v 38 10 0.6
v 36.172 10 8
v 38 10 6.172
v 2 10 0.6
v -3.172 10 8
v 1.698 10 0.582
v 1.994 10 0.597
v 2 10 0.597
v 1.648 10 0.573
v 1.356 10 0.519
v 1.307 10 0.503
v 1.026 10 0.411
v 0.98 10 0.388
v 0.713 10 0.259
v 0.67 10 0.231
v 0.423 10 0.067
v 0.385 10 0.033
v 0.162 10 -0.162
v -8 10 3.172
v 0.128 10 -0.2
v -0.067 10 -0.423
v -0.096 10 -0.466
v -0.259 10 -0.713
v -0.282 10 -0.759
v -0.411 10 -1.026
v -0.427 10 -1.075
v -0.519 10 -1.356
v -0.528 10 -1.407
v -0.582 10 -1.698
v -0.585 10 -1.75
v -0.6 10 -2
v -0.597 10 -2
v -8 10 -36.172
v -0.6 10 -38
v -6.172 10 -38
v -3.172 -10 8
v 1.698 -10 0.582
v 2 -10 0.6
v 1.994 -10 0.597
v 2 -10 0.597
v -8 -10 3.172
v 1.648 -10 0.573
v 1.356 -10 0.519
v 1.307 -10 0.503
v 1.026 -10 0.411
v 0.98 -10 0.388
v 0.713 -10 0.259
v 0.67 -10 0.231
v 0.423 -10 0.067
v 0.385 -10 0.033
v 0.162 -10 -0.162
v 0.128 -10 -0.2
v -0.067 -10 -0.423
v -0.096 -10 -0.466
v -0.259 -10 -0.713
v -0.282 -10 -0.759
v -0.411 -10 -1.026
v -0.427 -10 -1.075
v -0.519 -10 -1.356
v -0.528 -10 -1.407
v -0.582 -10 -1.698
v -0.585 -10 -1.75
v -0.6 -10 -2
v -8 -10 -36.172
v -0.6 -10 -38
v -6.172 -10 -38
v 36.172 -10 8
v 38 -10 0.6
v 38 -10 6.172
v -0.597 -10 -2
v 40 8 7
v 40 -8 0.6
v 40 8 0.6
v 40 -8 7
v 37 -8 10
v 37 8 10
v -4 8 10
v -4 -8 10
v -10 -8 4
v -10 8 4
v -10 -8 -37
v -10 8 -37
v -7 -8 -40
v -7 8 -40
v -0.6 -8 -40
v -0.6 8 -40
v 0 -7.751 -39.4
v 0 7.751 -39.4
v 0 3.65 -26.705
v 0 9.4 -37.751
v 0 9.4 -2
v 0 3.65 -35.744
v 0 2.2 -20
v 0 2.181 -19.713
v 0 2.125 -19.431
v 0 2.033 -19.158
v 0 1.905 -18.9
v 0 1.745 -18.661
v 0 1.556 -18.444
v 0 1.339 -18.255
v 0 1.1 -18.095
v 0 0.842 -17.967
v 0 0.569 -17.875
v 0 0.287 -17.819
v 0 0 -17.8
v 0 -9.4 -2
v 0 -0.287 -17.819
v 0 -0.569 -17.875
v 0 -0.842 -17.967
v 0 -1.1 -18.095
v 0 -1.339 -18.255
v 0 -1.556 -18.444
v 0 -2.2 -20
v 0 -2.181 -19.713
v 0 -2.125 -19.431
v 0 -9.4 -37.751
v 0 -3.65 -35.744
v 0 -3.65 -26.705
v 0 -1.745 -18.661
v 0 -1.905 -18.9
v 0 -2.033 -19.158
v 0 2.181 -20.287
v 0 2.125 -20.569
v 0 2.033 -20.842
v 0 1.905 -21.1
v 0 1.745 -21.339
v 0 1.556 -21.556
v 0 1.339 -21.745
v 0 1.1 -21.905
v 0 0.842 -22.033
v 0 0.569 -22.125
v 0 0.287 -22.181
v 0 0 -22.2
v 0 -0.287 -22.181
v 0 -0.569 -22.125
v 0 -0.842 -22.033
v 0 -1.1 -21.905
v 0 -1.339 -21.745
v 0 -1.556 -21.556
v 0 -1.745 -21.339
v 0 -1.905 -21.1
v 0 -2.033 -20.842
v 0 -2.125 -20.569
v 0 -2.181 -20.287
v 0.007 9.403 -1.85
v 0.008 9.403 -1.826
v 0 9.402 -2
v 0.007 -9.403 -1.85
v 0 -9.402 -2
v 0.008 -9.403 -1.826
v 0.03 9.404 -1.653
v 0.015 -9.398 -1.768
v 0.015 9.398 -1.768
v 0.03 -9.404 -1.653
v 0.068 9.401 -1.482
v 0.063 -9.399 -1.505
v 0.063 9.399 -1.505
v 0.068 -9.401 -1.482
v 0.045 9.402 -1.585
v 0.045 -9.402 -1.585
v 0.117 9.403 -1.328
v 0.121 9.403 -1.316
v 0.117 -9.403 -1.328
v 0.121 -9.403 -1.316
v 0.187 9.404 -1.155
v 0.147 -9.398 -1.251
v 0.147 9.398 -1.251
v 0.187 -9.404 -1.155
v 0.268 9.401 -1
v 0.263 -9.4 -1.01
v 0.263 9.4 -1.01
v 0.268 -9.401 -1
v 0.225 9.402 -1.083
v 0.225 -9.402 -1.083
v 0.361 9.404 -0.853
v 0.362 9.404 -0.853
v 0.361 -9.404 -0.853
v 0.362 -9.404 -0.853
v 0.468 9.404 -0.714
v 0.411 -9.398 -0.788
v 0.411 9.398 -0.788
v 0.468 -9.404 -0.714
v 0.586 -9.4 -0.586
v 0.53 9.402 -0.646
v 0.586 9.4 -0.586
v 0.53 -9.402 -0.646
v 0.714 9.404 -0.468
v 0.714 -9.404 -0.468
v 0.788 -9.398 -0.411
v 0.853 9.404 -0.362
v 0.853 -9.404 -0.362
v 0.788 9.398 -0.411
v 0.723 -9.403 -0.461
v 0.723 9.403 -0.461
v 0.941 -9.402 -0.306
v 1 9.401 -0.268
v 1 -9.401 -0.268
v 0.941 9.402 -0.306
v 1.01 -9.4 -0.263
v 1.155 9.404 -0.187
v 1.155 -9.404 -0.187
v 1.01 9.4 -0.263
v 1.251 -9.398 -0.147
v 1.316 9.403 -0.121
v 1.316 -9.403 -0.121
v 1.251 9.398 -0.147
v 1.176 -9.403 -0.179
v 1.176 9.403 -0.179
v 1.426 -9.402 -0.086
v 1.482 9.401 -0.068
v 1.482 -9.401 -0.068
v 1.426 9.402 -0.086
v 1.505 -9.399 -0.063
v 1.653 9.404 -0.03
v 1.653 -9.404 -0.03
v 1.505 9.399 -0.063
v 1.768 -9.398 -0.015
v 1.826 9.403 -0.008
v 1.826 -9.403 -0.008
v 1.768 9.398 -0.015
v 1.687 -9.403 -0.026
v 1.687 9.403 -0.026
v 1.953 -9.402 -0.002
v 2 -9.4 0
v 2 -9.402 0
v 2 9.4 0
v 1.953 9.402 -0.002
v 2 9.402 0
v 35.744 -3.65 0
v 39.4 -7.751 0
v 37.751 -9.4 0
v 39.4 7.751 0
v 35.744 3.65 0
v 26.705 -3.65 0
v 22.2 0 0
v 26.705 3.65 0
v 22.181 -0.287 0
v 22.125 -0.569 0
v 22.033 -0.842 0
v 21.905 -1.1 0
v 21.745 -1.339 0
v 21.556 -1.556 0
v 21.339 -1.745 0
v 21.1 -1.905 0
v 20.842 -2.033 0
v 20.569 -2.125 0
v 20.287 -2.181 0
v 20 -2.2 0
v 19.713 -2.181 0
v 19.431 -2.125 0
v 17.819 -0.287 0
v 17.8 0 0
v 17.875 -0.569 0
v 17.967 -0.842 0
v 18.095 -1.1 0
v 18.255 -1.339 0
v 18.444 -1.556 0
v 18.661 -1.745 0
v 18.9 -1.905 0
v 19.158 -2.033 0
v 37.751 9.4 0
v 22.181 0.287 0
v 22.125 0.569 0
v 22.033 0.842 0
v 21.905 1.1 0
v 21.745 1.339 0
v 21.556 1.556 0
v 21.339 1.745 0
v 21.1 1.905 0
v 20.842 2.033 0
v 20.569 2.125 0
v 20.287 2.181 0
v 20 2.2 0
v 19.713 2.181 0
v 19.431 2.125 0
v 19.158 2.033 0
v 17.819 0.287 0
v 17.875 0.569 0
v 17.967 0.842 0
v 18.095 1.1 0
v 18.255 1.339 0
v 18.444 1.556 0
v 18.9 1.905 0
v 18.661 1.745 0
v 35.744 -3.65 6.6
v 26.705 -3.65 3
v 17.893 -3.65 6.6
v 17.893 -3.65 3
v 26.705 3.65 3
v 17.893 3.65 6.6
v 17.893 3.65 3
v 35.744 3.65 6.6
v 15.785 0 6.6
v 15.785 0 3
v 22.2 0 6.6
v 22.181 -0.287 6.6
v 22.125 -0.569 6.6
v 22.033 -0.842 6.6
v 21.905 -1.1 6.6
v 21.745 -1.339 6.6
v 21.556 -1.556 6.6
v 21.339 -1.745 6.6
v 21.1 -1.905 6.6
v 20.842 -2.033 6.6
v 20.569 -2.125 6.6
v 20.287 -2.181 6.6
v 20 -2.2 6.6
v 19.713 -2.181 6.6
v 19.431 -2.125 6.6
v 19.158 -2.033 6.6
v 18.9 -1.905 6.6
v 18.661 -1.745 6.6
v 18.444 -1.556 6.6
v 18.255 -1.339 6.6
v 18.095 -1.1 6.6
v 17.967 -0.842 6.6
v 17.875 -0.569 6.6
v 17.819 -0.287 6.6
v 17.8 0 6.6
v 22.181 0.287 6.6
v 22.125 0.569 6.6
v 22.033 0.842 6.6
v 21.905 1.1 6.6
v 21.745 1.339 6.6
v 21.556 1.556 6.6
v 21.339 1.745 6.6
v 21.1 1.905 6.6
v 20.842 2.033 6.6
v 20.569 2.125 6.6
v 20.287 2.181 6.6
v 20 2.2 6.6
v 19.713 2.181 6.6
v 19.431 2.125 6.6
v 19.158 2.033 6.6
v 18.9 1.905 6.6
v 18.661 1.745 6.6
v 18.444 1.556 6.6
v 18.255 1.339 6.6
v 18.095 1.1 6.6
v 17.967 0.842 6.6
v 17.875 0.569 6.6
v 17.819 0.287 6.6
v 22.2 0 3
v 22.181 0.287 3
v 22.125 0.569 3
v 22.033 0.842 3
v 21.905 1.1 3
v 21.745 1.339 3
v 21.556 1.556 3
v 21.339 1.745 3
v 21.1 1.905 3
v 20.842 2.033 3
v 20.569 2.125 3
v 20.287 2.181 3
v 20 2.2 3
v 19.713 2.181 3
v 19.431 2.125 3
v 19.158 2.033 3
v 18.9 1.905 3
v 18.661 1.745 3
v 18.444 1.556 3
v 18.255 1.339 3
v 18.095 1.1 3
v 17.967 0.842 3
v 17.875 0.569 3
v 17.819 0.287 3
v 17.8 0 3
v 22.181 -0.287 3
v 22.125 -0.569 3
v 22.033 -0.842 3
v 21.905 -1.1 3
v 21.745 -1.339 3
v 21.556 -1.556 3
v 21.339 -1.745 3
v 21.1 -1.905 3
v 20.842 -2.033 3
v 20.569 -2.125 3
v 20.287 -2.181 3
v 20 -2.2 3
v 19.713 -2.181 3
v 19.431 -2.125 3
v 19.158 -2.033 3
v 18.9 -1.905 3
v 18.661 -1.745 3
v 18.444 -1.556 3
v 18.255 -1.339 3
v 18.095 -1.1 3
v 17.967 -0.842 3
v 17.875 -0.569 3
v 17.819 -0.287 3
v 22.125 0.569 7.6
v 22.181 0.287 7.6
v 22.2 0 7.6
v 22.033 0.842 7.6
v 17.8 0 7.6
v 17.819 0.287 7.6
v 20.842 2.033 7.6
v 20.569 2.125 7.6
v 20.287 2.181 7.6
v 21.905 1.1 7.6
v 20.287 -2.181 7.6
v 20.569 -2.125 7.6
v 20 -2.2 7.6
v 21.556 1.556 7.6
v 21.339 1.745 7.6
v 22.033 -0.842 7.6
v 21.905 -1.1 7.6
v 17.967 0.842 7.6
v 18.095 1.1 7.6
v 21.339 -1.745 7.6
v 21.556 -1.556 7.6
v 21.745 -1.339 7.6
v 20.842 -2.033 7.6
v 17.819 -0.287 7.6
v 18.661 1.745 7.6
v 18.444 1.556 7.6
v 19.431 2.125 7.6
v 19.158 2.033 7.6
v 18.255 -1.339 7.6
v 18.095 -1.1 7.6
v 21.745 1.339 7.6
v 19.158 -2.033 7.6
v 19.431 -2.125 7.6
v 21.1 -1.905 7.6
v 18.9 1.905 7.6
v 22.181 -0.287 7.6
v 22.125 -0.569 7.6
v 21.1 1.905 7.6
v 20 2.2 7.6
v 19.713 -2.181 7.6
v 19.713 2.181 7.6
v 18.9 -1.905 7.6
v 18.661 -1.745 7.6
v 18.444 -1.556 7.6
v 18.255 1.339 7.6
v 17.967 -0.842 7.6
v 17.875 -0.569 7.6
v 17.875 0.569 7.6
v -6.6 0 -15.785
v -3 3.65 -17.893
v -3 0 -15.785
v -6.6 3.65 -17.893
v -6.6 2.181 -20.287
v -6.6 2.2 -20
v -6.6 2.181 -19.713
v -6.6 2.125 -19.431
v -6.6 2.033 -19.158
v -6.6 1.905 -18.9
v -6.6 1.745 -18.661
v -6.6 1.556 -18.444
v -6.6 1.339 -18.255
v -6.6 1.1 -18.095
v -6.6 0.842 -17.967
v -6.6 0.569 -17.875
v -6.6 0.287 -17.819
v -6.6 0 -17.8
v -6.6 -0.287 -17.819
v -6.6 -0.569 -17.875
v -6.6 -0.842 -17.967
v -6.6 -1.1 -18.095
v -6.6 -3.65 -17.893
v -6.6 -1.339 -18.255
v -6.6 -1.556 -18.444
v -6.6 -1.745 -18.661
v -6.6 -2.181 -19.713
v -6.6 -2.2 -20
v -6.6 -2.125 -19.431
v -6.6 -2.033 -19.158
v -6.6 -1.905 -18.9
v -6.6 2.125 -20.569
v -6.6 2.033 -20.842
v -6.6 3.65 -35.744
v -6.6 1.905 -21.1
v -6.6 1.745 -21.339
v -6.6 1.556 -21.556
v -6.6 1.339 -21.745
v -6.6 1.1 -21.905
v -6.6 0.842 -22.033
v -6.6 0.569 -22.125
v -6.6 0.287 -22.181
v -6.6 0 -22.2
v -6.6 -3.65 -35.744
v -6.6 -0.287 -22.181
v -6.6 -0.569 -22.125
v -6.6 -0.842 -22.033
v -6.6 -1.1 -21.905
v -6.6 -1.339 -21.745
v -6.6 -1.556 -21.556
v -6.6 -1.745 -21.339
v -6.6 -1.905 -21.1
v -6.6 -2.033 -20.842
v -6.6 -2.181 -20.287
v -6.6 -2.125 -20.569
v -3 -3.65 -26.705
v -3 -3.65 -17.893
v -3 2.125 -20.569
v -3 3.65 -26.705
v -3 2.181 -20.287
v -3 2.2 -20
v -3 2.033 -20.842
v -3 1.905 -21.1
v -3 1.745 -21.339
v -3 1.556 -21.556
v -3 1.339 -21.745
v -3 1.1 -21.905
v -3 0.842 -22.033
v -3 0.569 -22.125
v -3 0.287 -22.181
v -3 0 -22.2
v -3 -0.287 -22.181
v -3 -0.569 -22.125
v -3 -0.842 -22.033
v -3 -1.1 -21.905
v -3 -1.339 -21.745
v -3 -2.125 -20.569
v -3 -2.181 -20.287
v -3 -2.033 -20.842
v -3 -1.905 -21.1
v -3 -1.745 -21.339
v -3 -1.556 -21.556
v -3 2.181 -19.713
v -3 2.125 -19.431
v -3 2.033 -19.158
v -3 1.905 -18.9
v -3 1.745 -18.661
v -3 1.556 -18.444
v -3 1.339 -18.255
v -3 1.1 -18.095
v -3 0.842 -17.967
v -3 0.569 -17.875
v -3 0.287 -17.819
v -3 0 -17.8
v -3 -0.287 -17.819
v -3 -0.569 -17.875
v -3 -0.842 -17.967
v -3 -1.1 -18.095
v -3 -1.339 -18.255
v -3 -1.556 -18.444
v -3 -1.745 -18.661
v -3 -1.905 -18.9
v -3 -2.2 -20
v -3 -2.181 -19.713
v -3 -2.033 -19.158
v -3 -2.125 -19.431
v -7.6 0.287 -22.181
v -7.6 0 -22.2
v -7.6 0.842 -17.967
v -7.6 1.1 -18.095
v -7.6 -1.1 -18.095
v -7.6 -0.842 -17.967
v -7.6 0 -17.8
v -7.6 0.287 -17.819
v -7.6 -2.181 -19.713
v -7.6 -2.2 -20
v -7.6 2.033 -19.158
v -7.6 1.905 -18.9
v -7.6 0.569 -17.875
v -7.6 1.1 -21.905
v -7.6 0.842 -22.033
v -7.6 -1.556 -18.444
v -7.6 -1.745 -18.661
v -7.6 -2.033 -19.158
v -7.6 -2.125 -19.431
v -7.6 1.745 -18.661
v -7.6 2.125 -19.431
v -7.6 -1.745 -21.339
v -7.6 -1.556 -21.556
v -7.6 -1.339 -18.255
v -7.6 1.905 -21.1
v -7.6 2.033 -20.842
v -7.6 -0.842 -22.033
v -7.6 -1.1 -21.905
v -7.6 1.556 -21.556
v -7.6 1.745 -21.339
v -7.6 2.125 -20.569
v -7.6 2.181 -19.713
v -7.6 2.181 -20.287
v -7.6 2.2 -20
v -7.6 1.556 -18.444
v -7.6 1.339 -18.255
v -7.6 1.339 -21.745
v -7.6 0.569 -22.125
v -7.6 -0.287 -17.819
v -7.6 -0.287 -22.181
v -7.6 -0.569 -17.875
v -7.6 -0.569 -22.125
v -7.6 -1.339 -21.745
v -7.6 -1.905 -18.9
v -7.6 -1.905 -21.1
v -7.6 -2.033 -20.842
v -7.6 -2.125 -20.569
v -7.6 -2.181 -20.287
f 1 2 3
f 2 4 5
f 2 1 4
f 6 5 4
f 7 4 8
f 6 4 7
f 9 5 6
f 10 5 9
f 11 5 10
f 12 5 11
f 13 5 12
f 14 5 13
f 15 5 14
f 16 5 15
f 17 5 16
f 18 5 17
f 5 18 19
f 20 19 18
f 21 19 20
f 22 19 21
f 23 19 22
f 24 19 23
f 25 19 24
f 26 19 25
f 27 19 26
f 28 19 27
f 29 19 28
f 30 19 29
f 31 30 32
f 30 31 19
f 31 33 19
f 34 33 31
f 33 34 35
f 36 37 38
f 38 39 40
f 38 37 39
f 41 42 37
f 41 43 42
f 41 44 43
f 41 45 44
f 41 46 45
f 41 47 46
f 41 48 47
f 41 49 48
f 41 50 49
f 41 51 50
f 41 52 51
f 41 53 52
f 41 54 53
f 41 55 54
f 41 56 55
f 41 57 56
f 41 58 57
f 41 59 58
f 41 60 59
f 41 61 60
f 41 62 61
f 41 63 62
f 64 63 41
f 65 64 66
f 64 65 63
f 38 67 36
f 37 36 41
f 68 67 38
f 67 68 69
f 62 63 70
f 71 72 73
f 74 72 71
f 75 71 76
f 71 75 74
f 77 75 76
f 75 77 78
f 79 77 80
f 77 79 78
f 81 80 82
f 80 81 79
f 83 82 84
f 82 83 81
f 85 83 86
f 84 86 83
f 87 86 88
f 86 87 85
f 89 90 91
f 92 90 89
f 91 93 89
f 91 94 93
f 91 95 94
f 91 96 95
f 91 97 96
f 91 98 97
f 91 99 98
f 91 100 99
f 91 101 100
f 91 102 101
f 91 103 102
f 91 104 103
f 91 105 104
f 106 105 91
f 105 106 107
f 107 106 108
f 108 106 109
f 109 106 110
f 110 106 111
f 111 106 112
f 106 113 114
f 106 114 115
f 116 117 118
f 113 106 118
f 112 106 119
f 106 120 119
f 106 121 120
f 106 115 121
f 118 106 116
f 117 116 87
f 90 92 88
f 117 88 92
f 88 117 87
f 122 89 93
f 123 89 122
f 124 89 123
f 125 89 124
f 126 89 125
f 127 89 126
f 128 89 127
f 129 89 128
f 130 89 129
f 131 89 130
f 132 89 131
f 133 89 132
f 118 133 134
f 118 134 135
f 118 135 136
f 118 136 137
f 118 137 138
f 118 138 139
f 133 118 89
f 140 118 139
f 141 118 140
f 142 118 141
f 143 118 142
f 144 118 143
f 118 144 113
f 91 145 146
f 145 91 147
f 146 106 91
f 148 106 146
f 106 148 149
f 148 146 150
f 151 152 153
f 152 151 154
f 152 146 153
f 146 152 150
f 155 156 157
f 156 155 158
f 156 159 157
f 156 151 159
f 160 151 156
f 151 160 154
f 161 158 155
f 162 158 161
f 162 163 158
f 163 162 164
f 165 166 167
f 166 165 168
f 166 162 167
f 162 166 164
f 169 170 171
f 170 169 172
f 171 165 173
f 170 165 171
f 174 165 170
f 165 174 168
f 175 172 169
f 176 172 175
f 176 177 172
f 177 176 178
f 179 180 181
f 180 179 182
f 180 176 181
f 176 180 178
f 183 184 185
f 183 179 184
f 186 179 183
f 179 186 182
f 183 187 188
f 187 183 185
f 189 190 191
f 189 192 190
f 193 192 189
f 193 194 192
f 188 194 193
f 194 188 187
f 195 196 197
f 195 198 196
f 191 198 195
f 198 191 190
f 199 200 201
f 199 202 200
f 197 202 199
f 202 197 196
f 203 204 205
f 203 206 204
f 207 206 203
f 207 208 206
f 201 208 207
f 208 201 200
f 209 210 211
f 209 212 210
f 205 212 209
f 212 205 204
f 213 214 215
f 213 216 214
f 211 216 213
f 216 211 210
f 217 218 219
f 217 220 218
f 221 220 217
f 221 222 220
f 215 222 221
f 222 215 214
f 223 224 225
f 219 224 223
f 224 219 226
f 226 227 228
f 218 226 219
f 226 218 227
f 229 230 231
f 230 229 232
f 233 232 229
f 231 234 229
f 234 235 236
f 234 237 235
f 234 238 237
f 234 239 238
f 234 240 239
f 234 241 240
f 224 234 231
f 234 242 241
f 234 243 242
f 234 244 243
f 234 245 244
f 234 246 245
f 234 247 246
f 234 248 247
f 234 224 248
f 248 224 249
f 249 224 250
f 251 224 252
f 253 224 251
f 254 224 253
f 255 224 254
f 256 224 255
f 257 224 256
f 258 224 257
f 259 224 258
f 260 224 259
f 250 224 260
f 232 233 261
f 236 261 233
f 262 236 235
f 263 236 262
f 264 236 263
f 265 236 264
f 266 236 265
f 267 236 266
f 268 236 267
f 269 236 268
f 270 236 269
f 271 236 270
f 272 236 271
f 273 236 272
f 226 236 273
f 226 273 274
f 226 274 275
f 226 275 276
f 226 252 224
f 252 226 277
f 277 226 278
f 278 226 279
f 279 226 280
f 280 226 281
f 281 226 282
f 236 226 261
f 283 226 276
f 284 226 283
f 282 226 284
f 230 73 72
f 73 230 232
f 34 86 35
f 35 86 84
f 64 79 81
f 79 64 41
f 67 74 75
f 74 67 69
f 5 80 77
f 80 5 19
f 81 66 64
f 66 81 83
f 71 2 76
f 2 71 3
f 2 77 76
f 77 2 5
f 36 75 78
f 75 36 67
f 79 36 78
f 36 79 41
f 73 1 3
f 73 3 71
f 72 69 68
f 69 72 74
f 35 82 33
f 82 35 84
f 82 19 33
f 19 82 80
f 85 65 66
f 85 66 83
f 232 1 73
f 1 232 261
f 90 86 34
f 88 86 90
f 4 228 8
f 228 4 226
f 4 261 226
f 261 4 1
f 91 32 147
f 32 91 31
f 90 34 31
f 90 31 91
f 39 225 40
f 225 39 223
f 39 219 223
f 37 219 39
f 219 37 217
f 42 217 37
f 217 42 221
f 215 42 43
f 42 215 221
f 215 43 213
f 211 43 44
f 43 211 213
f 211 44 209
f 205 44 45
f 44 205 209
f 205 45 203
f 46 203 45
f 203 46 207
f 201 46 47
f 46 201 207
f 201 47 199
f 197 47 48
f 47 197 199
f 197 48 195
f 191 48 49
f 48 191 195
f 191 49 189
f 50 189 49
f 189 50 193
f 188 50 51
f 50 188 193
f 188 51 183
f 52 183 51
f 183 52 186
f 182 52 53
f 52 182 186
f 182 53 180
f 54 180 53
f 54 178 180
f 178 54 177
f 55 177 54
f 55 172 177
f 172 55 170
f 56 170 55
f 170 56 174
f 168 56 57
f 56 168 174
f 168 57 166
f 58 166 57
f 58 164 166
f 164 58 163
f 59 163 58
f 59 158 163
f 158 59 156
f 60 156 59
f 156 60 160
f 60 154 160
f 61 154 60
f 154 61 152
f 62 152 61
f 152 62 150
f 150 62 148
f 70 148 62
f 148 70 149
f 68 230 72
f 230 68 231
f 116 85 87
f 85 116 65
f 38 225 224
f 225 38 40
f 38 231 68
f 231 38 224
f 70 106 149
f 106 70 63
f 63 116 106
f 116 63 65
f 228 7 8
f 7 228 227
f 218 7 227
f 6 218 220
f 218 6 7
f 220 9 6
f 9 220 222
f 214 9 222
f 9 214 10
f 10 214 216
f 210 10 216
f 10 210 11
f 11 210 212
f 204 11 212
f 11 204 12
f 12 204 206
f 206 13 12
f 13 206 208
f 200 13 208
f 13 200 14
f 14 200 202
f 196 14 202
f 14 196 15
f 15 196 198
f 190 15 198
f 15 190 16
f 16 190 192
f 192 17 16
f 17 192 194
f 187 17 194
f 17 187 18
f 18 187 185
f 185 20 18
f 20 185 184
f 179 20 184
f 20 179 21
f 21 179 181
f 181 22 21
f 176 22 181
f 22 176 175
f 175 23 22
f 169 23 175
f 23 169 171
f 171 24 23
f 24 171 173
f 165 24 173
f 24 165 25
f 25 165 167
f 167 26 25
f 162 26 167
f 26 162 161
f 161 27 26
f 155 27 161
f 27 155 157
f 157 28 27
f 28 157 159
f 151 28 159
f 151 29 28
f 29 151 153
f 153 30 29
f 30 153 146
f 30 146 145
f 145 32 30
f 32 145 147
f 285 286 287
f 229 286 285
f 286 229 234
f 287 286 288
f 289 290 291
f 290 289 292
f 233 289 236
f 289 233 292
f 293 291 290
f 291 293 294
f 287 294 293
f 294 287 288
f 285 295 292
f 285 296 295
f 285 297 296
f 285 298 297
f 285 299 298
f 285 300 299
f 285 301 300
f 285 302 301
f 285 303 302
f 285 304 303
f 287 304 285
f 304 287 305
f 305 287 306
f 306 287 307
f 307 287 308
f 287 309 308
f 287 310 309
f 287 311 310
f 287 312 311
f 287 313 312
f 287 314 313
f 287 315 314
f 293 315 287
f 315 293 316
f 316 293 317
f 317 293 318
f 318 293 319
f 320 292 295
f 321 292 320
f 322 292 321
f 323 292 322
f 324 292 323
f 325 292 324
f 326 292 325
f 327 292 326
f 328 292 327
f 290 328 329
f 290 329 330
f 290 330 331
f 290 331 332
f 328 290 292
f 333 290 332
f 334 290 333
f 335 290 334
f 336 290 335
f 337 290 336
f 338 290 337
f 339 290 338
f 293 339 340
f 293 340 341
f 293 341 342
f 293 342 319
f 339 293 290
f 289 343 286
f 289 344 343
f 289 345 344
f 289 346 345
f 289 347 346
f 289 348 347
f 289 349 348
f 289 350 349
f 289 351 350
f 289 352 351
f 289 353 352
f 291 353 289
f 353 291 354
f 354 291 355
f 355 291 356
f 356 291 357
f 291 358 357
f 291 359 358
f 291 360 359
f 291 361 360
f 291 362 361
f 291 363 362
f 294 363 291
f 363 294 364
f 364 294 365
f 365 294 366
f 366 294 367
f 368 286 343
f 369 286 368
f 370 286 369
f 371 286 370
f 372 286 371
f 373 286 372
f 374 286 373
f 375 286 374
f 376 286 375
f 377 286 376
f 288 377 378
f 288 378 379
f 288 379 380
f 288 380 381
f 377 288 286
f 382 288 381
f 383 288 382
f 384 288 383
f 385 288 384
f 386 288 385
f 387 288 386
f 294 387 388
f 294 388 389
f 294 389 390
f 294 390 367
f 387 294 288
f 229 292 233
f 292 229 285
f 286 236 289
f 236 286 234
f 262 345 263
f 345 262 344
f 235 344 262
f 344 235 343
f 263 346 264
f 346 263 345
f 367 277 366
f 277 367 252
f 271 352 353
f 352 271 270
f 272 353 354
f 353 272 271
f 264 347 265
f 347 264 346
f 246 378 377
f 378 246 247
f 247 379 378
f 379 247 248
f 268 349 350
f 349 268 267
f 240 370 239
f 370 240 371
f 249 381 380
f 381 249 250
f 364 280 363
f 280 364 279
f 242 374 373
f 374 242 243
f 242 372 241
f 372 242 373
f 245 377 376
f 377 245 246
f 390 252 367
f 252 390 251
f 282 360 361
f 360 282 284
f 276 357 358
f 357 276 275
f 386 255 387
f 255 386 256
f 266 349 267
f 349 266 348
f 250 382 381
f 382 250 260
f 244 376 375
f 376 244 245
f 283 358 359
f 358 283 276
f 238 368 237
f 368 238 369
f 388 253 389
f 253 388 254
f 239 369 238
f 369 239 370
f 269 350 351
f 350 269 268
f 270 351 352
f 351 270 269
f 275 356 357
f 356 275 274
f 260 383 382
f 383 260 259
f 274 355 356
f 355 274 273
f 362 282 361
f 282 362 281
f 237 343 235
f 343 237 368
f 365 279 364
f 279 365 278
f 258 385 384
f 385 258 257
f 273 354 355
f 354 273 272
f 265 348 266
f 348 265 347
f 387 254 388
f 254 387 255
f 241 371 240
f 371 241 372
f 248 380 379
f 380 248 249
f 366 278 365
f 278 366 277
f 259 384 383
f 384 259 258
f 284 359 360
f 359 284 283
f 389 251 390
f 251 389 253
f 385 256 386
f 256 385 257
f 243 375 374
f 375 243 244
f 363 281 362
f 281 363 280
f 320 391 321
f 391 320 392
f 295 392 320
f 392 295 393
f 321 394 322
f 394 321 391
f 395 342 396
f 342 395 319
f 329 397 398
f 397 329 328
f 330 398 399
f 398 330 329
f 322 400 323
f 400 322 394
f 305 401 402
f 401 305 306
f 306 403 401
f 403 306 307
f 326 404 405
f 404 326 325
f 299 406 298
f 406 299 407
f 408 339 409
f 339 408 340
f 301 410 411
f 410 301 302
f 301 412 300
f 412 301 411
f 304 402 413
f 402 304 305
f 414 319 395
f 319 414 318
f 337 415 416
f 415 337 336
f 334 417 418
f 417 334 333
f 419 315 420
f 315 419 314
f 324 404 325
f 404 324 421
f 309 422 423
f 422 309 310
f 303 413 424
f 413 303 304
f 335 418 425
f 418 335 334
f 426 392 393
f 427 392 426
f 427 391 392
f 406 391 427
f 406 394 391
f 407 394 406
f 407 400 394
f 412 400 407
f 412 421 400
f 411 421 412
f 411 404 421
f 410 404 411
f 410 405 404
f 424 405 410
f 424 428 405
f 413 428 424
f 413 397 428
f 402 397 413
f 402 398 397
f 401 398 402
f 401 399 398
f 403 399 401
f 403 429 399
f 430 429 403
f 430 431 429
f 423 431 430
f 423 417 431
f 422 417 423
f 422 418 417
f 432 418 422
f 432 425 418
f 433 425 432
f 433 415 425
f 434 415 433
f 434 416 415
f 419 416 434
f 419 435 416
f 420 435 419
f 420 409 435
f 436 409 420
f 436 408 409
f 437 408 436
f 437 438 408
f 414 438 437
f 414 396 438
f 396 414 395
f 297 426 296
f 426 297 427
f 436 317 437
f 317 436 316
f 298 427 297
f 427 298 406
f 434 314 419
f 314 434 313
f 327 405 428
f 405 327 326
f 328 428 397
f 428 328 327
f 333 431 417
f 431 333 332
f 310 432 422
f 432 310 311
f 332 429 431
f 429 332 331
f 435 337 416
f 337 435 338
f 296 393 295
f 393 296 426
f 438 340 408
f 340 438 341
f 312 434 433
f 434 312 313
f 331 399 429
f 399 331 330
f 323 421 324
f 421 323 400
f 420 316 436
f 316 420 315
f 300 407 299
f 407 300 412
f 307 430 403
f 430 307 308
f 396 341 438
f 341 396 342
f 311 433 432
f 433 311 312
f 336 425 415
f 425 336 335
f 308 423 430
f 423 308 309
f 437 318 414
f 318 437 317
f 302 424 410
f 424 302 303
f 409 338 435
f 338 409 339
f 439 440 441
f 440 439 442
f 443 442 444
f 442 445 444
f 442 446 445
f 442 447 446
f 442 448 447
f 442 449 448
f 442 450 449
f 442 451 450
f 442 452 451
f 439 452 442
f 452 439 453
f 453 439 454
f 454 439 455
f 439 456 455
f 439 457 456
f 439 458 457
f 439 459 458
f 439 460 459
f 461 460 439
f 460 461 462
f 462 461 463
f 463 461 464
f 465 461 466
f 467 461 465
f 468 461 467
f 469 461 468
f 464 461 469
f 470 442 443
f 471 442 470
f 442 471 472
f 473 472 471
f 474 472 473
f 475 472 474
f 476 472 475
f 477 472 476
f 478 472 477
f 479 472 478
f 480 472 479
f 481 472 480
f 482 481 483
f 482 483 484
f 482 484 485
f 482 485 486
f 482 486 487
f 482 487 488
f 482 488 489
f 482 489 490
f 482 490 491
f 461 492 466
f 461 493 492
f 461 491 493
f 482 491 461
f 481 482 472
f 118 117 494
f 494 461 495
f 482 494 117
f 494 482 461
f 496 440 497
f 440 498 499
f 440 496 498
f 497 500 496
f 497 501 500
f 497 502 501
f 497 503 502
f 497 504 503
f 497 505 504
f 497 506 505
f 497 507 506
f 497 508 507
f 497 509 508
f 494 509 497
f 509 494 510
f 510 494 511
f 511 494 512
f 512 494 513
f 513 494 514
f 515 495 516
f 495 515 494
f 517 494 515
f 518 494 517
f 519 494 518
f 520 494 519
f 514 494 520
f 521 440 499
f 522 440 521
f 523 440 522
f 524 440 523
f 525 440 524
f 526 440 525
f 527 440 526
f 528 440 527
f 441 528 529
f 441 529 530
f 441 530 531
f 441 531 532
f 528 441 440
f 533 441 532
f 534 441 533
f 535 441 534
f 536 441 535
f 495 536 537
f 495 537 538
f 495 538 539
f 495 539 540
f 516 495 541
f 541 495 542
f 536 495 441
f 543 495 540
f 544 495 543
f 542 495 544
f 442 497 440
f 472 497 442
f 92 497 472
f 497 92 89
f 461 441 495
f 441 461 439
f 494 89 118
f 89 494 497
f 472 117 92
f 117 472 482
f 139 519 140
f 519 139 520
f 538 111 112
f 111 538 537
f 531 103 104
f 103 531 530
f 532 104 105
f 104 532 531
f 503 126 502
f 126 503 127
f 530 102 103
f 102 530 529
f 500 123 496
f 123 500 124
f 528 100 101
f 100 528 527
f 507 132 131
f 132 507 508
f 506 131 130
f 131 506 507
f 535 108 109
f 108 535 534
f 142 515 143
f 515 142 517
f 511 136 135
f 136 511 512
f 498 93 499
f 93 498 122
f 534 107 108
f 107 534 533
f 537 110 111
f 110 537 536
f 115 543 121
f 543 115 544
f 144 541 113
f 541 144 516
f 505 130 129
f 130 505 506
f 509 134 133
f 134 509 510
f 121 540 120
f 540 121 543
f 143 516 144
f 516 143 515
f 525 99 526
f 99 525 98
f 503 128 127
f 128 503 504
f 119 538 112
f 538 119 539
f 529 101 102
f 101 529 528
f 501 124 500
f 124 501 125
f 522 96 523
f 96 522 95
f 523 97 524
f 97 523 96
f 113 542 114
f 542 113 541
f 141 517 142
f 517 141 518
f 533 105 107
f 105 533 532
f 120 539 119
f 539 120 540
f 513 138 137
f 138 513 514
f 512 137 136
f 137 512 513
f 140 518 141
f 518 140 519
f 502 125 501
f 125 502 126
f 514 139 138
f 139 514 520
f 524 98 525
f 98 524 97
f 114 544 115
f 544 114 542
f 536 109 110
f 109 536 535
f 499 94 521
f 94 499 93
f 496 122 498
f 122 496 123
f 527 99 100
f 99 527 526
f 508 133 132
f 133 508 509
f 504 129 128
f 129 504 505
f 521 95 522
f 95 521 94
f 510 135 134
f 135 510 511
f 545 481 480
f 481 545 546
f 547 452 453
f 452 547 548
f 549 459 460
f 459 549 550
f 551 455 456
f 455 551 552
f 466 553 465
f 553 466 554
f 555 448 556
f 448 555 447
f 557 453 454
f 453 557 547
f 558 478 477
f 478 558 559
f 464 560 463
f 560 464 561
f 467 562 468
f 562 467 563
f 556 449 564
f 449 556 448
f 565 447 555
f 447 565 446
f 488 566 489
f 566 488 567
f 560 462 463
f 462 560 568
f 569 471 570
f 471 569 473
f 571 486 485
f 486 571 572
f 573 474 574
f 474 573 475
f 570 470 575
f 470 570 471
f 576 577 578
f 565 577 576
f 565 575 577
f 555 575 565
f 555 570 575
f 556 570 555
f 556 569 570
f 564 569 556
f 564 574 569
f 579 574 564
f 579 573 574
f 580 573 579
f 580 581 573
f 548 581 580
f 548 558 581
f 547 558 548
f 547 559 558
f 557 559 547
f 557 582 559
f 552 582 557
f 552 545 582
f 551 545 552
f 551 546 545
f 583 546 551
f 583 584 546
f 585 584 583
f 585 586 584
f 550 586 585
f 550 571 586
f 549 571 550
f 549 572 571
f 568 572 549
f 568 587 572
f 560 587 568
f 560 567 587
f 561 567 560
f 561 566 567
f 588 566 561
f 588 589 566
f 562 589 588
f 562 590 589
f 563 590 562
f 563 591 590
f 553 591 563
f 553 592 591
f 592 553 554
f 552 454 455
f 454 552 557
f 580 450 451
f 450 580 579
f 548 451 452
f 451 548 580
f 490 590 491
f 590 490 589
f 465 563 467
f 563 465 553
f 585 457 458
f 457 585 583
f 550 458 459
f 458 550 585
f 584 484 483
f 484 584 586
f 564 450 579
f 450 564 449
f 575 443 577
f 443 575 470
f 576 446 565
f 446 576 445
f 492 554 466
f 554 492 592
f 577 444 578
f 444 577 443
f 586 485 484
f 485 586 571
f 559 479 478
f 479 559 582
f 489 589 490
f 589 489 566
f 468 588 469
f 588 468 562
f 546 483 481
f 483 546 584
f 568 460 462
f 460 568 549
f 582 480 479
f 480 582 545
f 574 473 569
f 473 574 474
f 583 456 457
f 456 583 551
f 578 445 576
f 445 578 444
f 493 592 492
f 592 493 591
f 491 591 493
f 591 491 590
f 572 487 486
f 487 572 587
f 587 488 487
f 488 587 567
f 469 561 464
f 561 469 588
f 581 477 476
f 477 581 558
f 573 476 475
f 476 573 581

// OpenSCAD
// file: inspection.scad
// Optional section clipping for OpenSCAD Customizer inspection.
// The bracket's default "None" mode passes the geometry through unchanged.
// For X/Y/Z, intersect geometry with a slab of the requested depth in mm.
module util_section_inspect(axis = "None", position_mm = 0, depth_mm = 10, direction = "Positive") {
    if (axis == "None")
        children();
    else {
        extent = 10000;
        low = (direction == "Negative") ? position_mm - depth_mm : position_mm;
        intersection() {
            children();
            if (axis == "X")
                translate([low, -extent / 2, -extent / 2])
                    cube([depth_mm, extent, extent]);
            else if (axis == "Y")
                translate([-extent / 2, low, -extent / 2])
                    cube([extent, depth_mm, extent]);
            else if (axis == "Z")
                translate([-extent / 2, -extent / 2, low])
                    cube([extent, extent, depth_mm]);
        }
    }
}
// main file
// Outside-corner L bracket for plywood joints.
// All dimensions are in millimetres. Adjust settings in the OpenSCAD Customizer.
//
// Side view (X to the right, Z upwards), with wood inside the bracket:
//
//     ____________________        <- bracket, top arm (outside the horizontal panel)
//    /  ##################
//   |  ||==================      <- horizontal plywood panel (10 mm)
//   |  ||
//   |  ||  vertical plywood panel
//   |  ||
//    bracket, vertical arm (outside the upright panel)
//
// Bolts enter from inside the plywood and thread into captive nuts in the bracket.
// Insert a nut through the access window on the wood-facing side of the bracket,
// slide it under the 3 mm retaining wall and push it against the stop.
// Hook the plug tab under the retaining lip, then press the opposite end down.
// The plywood covers the window; the outside face of the bracket stays solid.
//
// PRINTING: put the bracket on one flat side and the plugs on their sides.
// This lets layer lines follow the part outlines for improved strength.
//
// Requires inspection.scad in this directory for the optional section view.

use <inspection.scad>

/* [Display] */
part = "bracket"; // [bracket, plug]
show_wood  = true;     // translucent plywood preview; excluded from STL
show_plugs = false;    // display fitted plugs; excluded from STL
part_color = [0.29, 0.56, 0.72]; // color
plug_color = [0.93, 0.58, 0.22]; // color

/* [Section inspection] */
c_section_axis = "None";     // [None, X, Y, Z]
c_section_position_mm = 0;          // [-60:0.5:60]
c_section_depth_mm = 10;         // [0.1:0.1:80]
c_section_direction = "Positive"; // [Positive, Negative]

/* [Plywood] */
plywood_thickness = 10;     // plywood thickness
preview_panel_width = 60;     // panel width, display only
preview_panel_length = 80;     // panel length, display only

/* [Bracket geometry] */
bracket_width        = 20;   // bracket width across Y
wall_thickness       = 10;   // nominal arm thickness
horizontal_arm_length = 40;  // top-arm length
vertical_arm_length   = 40;  // vertical-arm length
outer_corner_chamfer  = 6;   // large 45-degree outer corner chamfer
arm_end_chamfer       = 3;   // 45-degree chamfer at both arm ends
side_edge_chamfer     = 2;   // bevel on the broad side-face outer edges; 0 disables

/* [Print compensation] */
elephant_foot_relief = 0.6; // 45-degree relief at print-facing contact edges; 0 disables
inside_corner_radius = 2.0; // plywood inside corner must match; use 0 or >= 1 mm

/* [Bolt and captive nut] */
bolt_offset                 = 10;    // bolt position beyond the inner face of the other panel
nut_type                    = "hex"; // [hex, square]
bolt_diameter               = 4;
bolt_clearance              = 0.4;
nut_across_flats            = 7;     // measure actual M4 nuts
nut_thickness               = 3.2;
nut_clearance               = 0.3;
retaining_wall_thickness    = 3;     // load-bearing wall between plywood and nut
blind_bolt_clearance_depth  = 1;     // extra bolt depth behind the nut
// Nominal M4x16 is only a starting assumption; verify the real stack-up.

/* [Window plug] */
plug_clearance            = 0.15;
nut_to_window_slot_length = 2.5; // free slot used by the plug hook
plug_tab_thickness        = 2.4;
window_extra_length       = 0.6;  // allows angled plug insertion
plug_end_chamfer          = 1.0;  // insertion bevel at the far end
plug_handle               = "hole"; // [hole, slot, none]

/* [Hidden] */
$fn = 48;

// ---------- Derived dimensions ----------
nut_pocket_width = nut_across_flats + nut_clearance;   // nut pocket width (across flats)
nut_pocket_length = (nut_type == "hex") ? nut_pocket_width / cos(30) : nut_pocket_width;   // pocket length (hex vertex-to-vertex)
nut_pocket_depth = nut_thickness + 0.4;           // nut-pocket depth
outside_skin = wall_thickness - retaining_wall_thickness - nut_pocket_depth - blind_bolt_clearance_depth;   // closed outside wall
window_depth = retaining_wall_thickness + nut_pocket_depth;  // window depth from wood-facing surface
window_length = nut_pocket_length + window_extra_length;        // window length
plug_tab_length = nut_to_window_slot_length - 0.2;         // plug tab length

top_bolt_x = plywood_thickness + bolt_offset;           // top-arm bolt X position
vertical_bolt_z = -(plywood_thickness + bolt_offset);        // vertical-arm bolt Z position
top_window_start_x = top_bolt_x + nut_pocket_length / 2 + nut_to_window_slot_length;    // top-arm window start
vertical_window_start_z = vertical_bolt_z - nut_pocket_length / 2 - nut_to_window_slot_length;    // vertical-arm window start

echo("Outer skin behind nut (mm):", outside_skin);
echo("Window end (mm):", top_window_start_x + window_length, " arm length:", horizontal_arm_length);

// ---------- Plywood preview (joint corner at origin) ----------
module wood() {
    color("burlywood", 0.45) difference() {
        union() {
            translate([0, -preview_panel_width / 2, -plywood_thickness]) cube([preview_panel_length, preview_panel_width, plywood_thickness]);
            translate([0, -preview_panel_width / 2, -preview_panel_length]) cube([plywood_thickness, preview_panel_width, preview_panel_length - plywood_thickness]);
        }
        translate([top_bolt_x, 0, -plywood_thickness - 1]) cylinder(d = bolt_diameter + bolt_clearance, h = plywood_thickness + 2);
        translate([-1, 0, vertical_bolt_z]) rotate([0, 90, 0]) cylinder(d = bolt_diameter + bolt_clearance, h = plywood_thickness + 2);
        // Remove material at the inside corner to match the bracket radius.
        if (inside_corner_radius > 0) difference() {
            translate([-1, -preview_panel_width / 2 - 1, -inside_corner_radius]) cube([inside_corner_radius + 1, preview_panel_width + 2, inside_corner_radius + 1]);
            translate([inside_corner_radius, 0, -inside_corner_radius]) rotate([90, 0, 0]) cylinder(r = inside_corner_radius, h = preview_panel_width + 4, center = true);
        }
    }
}

// ---------- Bracket side profile ----------
// Make the inside fillet from ordinary 2D shapes, before extrusion.
// The square sits in the open part of the L, at the sharp inner corner.
// Subtracting a circle leaves only the small curved region to add.
// Keep 72 segments (5 degrees each) to match the legacy 19-point arc.
module inside_corner_fill_2d(r) {
    difference() {
        translate([0, -r]) square([r, r]);
        translate([r, -r]) circle(r = r, $fn = 72);
    }
}

// End edges also receive elephant-foot relief so the wood-facing bevel
// continues around side edges, ends, and the inside corner.
top_arm_inner_tip_points  = (elephant_foot_relief > 0) ? [[horizontal_arm_length - elephant_foot_relief, 0], [horizontal_arm_length, elephant_foot_relief]] : [[horizontal_arm_length, 0]];
vertical_arm_inner_tip_points = (elephant_foot_relief > 0) ? [[-elephant_foot_relief, -vertical_arm_length], [0, -vertical_arm_length + elephant_foot_relief]] : [[0, -vertical_arm_length]];

// Draw the unchanged L outline with a sharp inside corner at (0,0).
// The arm-end and outside-corner chamfers are part of this outline.
module base_profile_2d() {
    polygon(concat(top_arm_inner_tip_points, [
        [horizontal_arm_length, wall_thickness - arm_end_chamfer],            // 45-degree top-arm end
        [horizontal_arm_length - arm_end_chamfer, wall_thickness],
        [-wall_thickness + outer_corner_chamfer, wall_thickness],
        [-wall_thickness, wall_thickness - outer_corner_chamfer],             // 45-degree outside corner
        [-wall_thickness, -vertical_arm_length + arm_end_chamfer],
        [-wall_thickness + arm_end_chamfer, -vertical_arm_length]           // 45-degree vertical-arm end
    ], vertical_arm_inner_tip_points, [[0, 0]]));
}

// Complete the side profile in 2D, then extrude it in profile_body().
// Radius zero leaves the original sharp corner without creating a square.
module bracket_profile_2d() {
    union() {
        base_profile_2d();
        if (inside_corner_radius > 0) inside_corner_fill_2d(inside_corner_radius);
    }
}

// Convex envelope of the bracket with its inside corner filled in. Side
// chamfers affect the outer edges only; the wood-facing area stays flat.
module outer_chamfer_envelope_2d() {
    polygon([
        [horizontal_arm_length, -vertical_arm_length], [horizontal_arm_length, wall_thickness - arm_end_chamfer], [horizontal_arm_length - arm_end_chamfer, wall_thickness], [-wall_thickness + outer_corner_chamfer, wall_thickness],
        [-wall_thickness, wall_thickness - outer_corner_chamfer], [-wall_thickness, -vertical_arm_length + arm_end_chamfer], [-wall_thickness + arm_end_chamfer, -vertical_arm_length]
    ]);
}

module outer_side_chamfer_keep_envelope() {
    rotate([90, 0, 0]) hull() {
        linear_extrude(height = bracket_width - 2 * side_edge_chamfer, center = true) outer_chamfer_envelope_2d();
        linear_extrude(height = bracket_width, center = true) offset(delta = -side_edge_chamfer) outer_chamfer_envelope_2d();
    }
}

// Plain extruded side profile before side chamfers or pockets.
module profile_body() {
    rotate([90, 0, 0])
        linear_extrude(height = bracket_width, center = true)
            bracket_profile_2d();
}

module outer_side_chamfered_body() {
    if (side_edge_chamfer > 0)
        intersection() {
            profile_body();
            outer_side_chamfer_keep_envelope();
        }
    else
        profile_body();
}

// ---------- Elephant-foot print compensation: cut geometry ----------
// The bracket is printed on either broad side face. First-layer bulging can
// interfere with the plywood-facing edges, so we describe the small volumes
// that must be REMOVED and subtract them with difference().
//
// This deliberately follows the archive-wide design rule:
//   easy-to-describe unwanted material -> explicit cutter + difference().
//
// The relief consists of:
//   1. straight 45-degree cuts along both plywood-facing arm edges;
//   2. a revolved 45-degree cut around the rounded inside corner;
//   3. short diagonal cuts where the relief meets the outer side chamfer.
//
// The same cutter set is mirrored to both printable side faces.

module elephant_foot_wedge_profile_2d() {
    polygon([
        [bracket_width / 2 - elephant_foot_relief - 1, -1],
        [bracket_width / 2 + 1, -1],
        [bracket_width / 2 + 1, elephant_foot_relief + 1]
    ]);
}

// Local 45-degree cutter swept along one diagonal arm-tip junction.
// A, U, V and direction describe the local coordinate system.
module elephant_foot_edge_cut(A, U, V, direction, length) {
    multmatrix([
        [U[0], V[0], direction[0], A[0]],
        [U[1], V[1], direction[1], A[1]],
        [U[2], V[2], direction[2], A[2]],
        [0, 0, 0, 1]
    ])
        linear_extrude(height = length)
            polygon([
                [-elephant_foot_relief - 1, -1],
                [1, -1],
                [1, elephant_foot_relief + 1]
            ]);
}

// Complete set of small removal volumes for print-facing edge relief.
module elephant_foot_relief_cuts() {
    s2 = sqrt(2) / 2;

    if (elephant_foot_relief > 0)
        for (mirror_side = [0, 1])
            mirror([0, mirror_side, 0]) {
                // Where print relief meets the diagonal outer side chamfer.
                if (side_edge_chamfer > 0) {
                    elephant_foot_edge_cut(
                        [horizontal_arm_length - side_edge_chamfer - s2,
                         bracket_width / 2 + s2, 0],
                        [s2, s2, 0],
                        [0, 0, 1],
                        [s2, -s2, 0],
                        side_edge_chamfer * sqrt(2) + 2
                    );

                    elephant_foot_edge_cut(
                        [0,
                         bracket_width / 2 - side_edge_chamfer - s2,
                         -vertical_arm_length - s2],
                        [0, s2, -s2],
                        [-1, 0, 0],
                        [0, s2, s2],
                        side_edge_chamfer * sqrt(2) + 2
                    );
                }

                // Straight plywood-facing edge of the horizontal arm.
                translate([inside_corner_radius, 0, 0])
                    rotate([90, 0, 90])
                        linear_extrude(
                            height = horizontal_arm_length + 1 - inside_corner_radius
                        )
                            elephant_foot_wedge_profile_2d();

                // Straight plywood-facing edge of the vertical arm.
                translate([0, 0, -vertical_arm_length - 1])
                    rotate([0, 0, 90])
                        linear_extrude(
                            height = vertical_arm_length + 1 - inside_corner_radius
                        )
                            elephant_foot_wedge_profile_2d();

                // Rounded plywood-facing inside corner.
                if (inside_corner_radius >= 1)
                    translate([
                        inside_corner_radius,
                        0,
                        -inside_corner_radius
                    ])
                        rotate([90, 0, 0])
                            rotate([0, 0, 89])
                                rotate_extrude(angle = 92)
                                    polygon([
                                        [
                                            inside_corner_radius - 1,
                                            bracket_width / 2
                                                - elephant_foot_relief - 1
                                        ],
                                        [
                                            inside_corner_radius - 1,
                                            bracket_width / 2 + 1
                                        ],
                                        [
                                            inside_corner_radius
                                                + elephant_foot_relief + 1,
                                            bracket_width / 2 + 1
                                        ]
                                    ]);
            }
}

module print_compensated_body() {
    difference() {
        outer_side_chamfered_body();
        elephant_foot_relief_cuts();
    }
}

// ---------- Captive-nut pocket with window on wood-facing side ----------
// The nut pocket lies behind retaining_wall_thickness. A free slot connects the pocket
// to the access window. Slide the nut through the window towards the corner,
// then hook the plug tab into the slot.

// Top arm: bolt along Z.
module top_fastener_cut() {
    z0 = retaining_wall_thickness;
    if (nut_type == "hex") {
        translate([top_bolt_x, 0, z0]) cylinder(d = nut_pocket_length, h = nut_pocket_depth, $fn = 6);
        translate([top_bolt_x, -nut_pocket_width / 2, z0]) cube([nut_pocket_length / 2 + nut_to_window_slot_length + 0.02, nut_pocket_width, nut_pocket_depth]);
    } else
        translate([top_bolt_x - nut_pocket_length / 2, -nut_pocket_width / 2, z0]) cube([nut_pocket_length + nut_to_window_slot_length + 0.02, nut_pocket_width, nut_pocket_depth]);
    // Window opening from the wood-facing surface.
    translate([top_window_start_x - 0.01, -nut_pocket_width / 2, -0.01]) cube([window_length + 0.01, nut_pocket_width, window_depth + 0.01]);
    // Bolt hole through retaining wall plus blind clearance behind nut.
    translate([top_bolt_x, 0, -1]) cylinder(d = bolt_diameter + bolt_clearance, h = retaining_wall_thickness + 2);
    translate([top_bolt_x, 0, z0 + nut_pocket_depth - 0.01]) cylinder(d = bolt_diameter + bolt_clearance, h = blind_bolt_clearance_depth + 0.01);
}

// Vertical arm: bolt along X.
module vertical_fastener_cut() {
    x0 = -window_depth;
    if (nut_type == "hex") {
        translate([x0, 0, vertical_bolt_z]) rotate([0, 90, 0]) cylinder(d = nut_pocket_length, h = nut_pocket_depth, $fn = 6);
        translate([x0, -nut_pocket_width / 2, vertical_window_start_z - 0.02]) cube([nut_pocket_depth, nut_pocket_width, nut_pocket_length / 2 + nut_to_window_slot_length + 0.02]);
    } else
        translate([x0, -nut_pocket_width / 2, vertical_window_start_z - 0.02]) cube([nut_pocket_depth, nut_pocket_width, nut_pocket_length + nut_to_window_slot_length + 0.02]);
    // Window opening from the wood-facing surface.
    translate([x0, -nut_pocket_width / 2, vertical_window_start_z - window_length]) cube([window_depth + 0.01, nut_pocket_width, window_length + 0.01]);
    // Bolt hole through retaining wall plus blind clearance behind nut.
    translate([1, 0, vertical_bolt_z]) rotate([0, -90, 0]) cylinder(d = bolt_diameter + bolt_clearance, h = retaining_wall_thickness + 2);
    translate([x0 + 0.01, 0, vertical_bolt_z]) rotate([0, -90, 0]) cylinder(d = bolt_diameter + bolt_clearance, h = blind_bolt_clearance_depth + 0.01);
}

module bracket() {
    difference() {
        print_compensated_body();
        top_fastener_cut();
        vertical_fastener_cut();
    }
}

// ---------- Access-window plug ----------
// Window-local coordinates: u runs along the arm towards its end (0=start),
// v is transverse (Y), and w is depth from the wood-facing surface.
// The tab at u<0 engages the slot under the retaining wall.
// Insert the tab at an angle, then press the far end flush with the wood face.
module plug_local() {
    pc = plug_clearance;
    pw = nut_pocket_width - 2 * pc;
    difference() {
        rotate([90, 0, 0]) linear_extrude(height = pw, center = true)
            polygon([
                [pc, 0], [window_length - pc, 0],
                [window_length - pc, window_depth - pc - plug_end_chamfer], [window_length - pc - plug_end_chamfer, window_depth - pc],   // insertion bevel
                [-plug_tab_length, window_depth - pc],                                           // bottom face and tab
                [-plug_tab_length, window_depth - pc - plug_tab_thickness], [pc, window_depth - pc - plug_tab_thickness]
            ]);
        // Extraction hole (pin/small screw) or screwdriver slot.
        if (plug_handle == "hole") translate([window_length / 2, 0, -1]) cylinder(d = 2.5, h = 5, $fn = 24);
        if (plug_handle == "slot") translate([window_length - pc - 3, -pw / 2 - 1, -1]) cube([1.2, pw + 2, 3]);
    }
}

// Lay plugs on their sides for printing; layer lines run through each tab.
module plug_print() {
    translate([plug_tab_length, window_depth, (nut_pocket_width - 2 * plug_clearance) / 2]) rotate([90, 0, 0]) plug_local();
}

// Two separate plugs positioned for printing and documentation exports.
module plugs_print_pair() {
    for (i = [0, 1])
        translate([i * (window_length + plug_tab_length + 4), 0, 0])
            plug_print();
}

// Show installed plugs in the access windows for visual inspection only.
module plugs_in_place() {
    translate([top_window_start_x, 0, 0]) plug_local();
    multmatrix([[0, 0, -1, 0], [0, -1, 0, 0], [-1, 0, 0, vertical_window_start_z], [0, 0, 0, 1]]) plug_local();
}

// ===== DISPLAY / PRINT-PART SELECTOR =====
if (part == "plug") {
    util_section_inspect(c_section_axis, c_section_position_mm, c_section_depth_mm, c_section_direction)
        color(plug_color)
            plugs_print_pair();
} else {
    util_section_inspect(c_section_axis, c_section_position_mm, c_section_depth_mm, c_section_direction)
        color(part_color) bracket();
    if (show_wood)
        %util_section_inspect(c_section_axis, c_section_position_mm, c_section_depth_mm, c_section_direction)
            wood();
    if (show_plugs)
        %util_section_inspect(c_section_axis, c_section_position_mm, c_section_depth_mm, c_section_direction)
            color(plug_color) plugs_in_place();
}
